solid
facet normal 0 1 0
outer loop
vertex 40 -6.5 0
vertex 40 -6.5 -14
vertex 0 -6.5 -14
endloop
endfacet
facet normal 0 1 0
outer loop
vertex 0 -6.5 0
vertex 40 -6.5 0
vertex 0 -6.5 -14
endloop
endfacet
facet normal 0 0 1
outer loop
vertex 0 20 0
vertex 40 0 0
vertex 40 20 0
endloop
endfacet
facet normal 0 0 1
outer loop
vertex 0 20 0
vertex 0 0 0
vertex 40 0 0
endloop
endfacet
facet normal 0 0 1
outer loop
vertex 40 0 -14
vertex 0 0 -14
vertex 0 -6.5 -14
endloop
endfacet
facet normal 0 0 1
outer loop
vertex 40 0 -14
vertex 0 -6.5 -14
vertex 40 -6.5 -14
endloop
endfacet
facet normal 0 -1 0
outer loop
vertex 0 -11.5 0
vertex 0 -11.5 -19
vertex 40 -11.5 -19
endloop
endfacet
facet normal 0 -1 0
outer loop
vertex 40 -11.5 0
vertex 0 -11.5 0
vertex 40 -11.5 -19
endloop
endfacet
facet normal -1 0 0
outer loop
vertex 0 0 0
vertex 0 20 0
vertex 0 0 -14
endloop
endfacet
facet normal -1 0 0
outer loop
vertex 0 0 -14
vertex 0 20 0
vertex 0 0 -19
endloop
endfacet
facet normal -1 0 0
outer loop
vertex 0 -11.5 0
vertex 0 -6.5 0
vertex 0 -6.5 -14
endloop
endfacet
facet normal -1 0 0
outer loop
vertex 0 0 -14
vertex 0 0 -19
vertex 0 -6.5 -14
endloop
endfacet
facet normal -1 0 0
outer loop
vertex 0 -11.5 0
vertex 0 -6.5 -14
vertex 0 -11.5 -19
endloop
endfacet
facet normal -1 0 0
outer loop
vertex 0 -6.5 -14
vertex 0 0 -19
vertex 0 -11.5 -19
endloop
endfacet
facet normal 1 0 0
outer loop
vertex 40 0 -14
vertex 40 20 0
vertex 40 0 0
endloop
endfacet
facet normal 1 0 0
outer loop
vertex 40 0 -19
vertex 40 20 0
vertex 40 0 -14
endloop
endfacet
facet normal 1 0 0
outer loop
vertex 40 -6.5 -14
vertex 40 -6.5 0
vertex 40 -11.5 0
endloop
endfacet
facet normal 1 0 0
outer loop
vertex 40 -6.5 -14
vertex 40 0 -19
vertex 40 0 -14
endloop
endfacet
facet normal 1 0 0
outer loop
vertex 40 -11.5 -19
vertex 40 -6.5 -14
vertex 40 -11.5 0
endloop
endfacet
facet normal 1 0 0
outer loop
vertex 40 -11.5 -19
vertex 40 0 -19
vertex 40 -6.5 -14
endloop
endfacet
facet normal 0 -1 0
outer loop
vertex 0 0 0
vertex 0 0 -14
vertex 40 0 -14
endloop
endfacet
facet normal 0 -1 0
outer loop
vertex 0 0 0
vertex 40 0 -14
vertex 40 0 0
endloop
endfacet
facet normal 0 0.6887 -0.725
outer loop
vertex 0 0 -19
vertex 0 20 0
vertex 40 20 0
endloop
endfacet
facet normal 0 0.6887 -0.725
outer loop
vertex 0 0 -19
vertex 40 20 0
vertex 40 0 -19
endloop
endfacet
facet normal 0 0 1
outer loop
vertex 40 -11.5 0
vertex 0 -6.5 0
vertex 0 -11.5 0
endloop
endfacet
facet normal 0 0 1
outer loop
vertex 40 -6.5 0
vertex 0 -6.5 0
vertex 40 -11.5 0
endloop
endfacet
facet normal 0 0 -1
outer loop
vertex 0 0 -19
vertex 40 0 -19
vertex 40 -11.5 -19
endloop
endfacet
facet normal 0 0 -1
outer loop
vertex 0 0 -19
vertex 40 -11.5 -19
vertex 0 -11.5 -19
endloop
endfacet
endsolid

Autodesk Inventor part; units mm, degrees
ref_plane "YZ Plane" through (0, 0, 0) normal (1, 0, 0) x (0, 1, 0)
ref_plane "XZ Plane" through (0, 0, 0) normal (0, 1, 0) x (-1, 0, 0)
ref_plane "XY Plane" through (0, 0, 0) normal (0, 0, 1) x (1, 0, 0)
sketch "Sketch1" plane through (0, 0, 0) normal (1, 0, 0) x (0, 1, 0)
  line L0 (0, 0) -> (20, 0)
  line L1 (20, 0) -> (0, -19)
  line L2 (0, -19) -> (0, 0)
  dimension "d0" = 20
  dimension "d1" = 19
extrude "Extrusion1" add sketch "Sketch1" along normal blind 40
sketch "Sketch2" plane through (0, 0, -19) normal (0, -1, 0) x (1, 0, 0)
  line L0 (40, 19) -> (40, 0) projected
  line L1 (40, 0) -> (0, 0)
  line L2 (0, 0) -> (0, 5)
  line L3 (0, 5) -> (40, 5)
  line L4 (40, 5) -> (40, 0)
  point P0 (0, 19)
  dimension "d4" = 5
extrude "Extrusion2" add sketch "Sketch2" along normal blind 11.5
sketch "Sketch3" plane through (0, 0, -14) normal (0, 0, 1) x (1, 0, 0)
  line L0 (40, 0) -> (40, -11.5) projected
  line L1 (0, -11.5) -> (40, -11.5)
  line L2 (40, -11.5) -> (40, -6.5)
  line L3 (40, -6.5) -> (0, -6.5)
  line L4 (0, -6.5) -> (0, -11.5)
  point P0 (0, 0)
  dimension "d7" = 5
extrude "Extrusion3" add sketch "Sketch3" along normal blind 14
properties part number "Ooze_Ramp_Bottom"
